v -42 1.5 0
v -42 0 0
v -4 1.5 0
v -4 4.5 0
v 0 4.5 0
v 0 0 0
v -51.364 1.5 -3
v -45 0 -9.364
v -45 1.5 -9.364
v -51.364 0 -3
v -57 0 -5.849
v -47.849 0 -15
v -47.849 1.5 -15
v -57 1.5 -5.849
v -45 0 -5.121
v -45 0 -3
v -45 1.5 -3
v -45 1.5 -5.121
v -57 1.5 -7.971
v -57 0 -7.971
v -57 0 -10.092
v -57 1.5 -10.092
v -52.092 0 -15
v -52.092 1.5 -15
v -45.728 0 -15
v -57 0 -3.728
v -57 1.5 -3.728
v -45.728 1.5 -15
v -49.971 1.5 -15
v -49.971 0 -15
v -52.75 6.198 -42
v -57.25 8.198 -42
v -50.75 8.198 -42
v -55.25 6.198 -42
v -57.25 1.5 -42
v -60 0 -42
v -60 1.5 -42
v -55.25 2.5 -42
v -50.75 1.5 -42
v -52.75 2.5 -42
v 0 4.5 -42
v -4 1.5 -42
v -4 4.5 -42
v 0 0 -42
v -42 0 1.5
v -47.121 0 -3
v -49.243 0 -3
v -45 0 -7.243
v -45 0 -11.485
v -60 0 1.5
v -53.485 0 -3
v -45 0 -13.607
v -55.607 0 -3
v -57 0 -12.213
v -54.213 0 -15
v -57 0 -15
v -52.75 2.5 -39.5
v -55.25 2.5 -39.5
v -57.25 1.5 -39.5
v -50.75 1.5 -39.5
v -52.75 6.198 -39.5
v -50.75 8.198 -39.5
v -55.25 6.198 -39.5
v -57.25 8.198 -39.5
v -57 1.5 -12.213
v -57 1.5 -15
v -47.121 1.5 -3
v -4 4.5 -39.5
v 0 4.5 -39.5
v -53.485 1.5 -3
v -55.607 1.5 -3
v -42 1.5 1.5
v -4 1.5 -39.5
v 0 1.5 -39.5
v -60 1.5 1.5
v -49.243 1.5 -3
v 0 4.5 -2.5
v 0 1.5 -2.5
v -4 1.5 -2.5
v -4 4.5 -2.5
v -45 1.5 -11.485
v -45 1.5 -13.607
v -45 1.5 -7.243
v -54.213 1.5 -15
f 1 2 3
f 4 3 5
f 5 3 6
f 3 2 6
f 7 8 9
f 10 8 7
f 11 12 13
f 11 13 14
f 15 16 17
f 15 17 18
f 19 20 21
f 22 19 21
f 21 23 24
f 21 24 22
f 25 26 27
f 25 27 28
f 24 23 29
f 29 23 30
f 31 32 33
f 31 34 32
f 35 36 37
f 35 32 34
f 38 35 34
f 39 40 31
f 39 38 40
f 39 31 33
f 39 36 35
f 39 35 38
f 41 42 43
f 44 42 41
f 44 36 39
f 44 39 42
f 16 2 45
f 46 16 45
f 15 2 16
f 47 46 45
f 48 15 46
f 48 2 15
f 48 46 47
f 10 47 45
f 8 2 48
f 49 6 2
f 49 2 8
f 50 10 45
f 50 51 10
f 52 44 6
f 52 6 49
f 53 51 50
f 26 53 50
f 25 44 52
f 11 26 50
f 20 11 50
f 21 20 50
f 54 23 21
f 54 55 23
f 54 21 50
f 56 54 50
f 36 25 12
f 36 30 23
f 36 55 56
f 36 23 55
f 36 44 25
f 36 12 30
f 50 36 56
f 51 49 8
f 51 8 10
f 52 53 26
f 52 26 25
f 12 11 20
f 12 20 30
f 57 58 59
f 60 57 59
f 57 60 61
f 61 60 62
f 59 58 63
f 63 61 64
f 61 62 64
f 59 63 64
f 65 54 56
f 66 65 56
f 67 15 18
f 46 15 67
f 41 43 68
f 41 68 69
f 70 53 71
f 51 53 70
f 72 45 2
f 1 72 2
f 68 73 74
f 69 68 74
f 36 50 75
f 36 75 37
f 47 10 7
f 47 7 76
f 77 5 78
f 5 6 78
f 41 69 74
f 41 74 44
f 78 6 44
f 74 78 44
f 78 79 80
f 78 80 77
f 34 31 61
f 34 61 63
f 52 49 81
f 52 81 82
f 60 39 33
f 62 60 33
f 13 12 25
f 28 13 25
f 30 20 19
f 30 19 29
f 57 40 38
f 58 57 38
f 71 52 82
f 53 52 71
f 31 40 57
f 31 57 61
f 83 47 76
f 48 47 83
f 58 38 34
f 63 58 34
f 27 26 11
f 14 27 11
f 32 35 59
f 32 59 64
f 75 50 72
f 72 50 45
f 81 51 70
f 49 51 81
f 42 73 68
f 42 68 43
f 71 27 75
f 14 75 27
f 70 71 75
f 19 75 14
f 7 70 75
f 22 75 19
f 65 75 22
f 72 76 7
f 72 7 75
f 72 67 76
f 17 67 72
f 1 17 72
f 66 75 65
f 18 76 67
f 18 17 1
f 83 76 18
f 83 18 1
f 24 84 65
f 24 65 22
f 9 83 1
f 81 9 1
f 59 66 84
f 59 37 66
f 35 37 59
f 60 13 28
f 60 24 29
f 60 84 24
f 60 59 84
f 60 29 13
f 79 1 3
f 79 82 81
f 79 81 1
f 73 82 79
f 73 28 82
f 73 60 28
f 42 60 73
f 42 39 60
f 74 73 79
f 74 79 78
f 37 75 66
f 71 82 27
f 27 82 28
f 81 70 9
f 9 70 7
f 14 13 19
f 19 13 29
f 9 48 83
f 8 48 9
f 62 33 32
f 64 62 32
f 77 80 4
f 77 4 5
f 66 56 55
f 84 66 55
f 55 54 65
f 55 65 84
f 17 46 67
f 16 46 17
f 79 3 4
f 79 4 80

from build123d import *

# Parameters (mm, degrees)
SKETCH_1_W          = 60
SKETCH_1_H          = 42
EXTRUDE_1_DEPTH     = 1.5
SKETCH_2_W          = 18
SKETCH_2_H          = 1.5
EXTRUDE_2_DEPTH     = 1.5
SKETCH_3_W          = 12
SKETCH_3_H          = 12
CUT_EXTRUDE_1_DEPTH = 74.254692682
EXTRUDE_1_2_DEPTH   = 1.5
SKETCH_5_W          = 6.5
SKETCH_5_H          = 6.698076211
SKETCH_5_W_2        = 2.5
SKETCH_5_H_2        = 3.698076211
EXTRUDE_3_DEPTH     = 2.5
SKETCH_7_W          = 4
SKETCH_7_H          = 2.5
EXTRUDE_4_DEPTH     = 3


with BuildPart() as part:
    # Эскиз1 → Extrude 1 (new body)
    with BuildSketch(Plane(origin=(0, 0, 0), x_dir=(1, 0, 0), z_dir=(0, 1, 0))):
        with Locations((-30, 21)):
            Rectangle(SKETCH_1_W, SKETCH_1_H)
    extrude(amount=EXTRUDE_1_DEPTH)

    # Эскиз2 → Бобышка-Вытянуть2 (add, through all)
    with BuildSketch(Plane(origin=(0, 0, 0), x_dir=(1, 0, 0), z_dir=(0, 1, 0))):
        with Locations((-51, -0.75)):
            Rectangle(SKETCH_2_W, SKETCH_2_H)
    extrude(amount=EXTRUDE_2_DEPTH)

    # Эскиз3 → Вырез-Вытянуть1 (cut, through all)
    with BuildSketch(Plane(origin=(0, 0, 0), x_dir=(1, 0, 0), z_dir=(0, 1, 0))):
        with Locations((-51, 9)):
            Rectangle(SKETCH_3_W, SKETCH_3_H)
    extrude(amount=CUT_EXTRUDE_1_DEPTH, mode=Mode.SUBTRACT)

    # Эскиз4 → Extrude 1 2 (add, through all)
    with BuildSketch(Plane(origin=(0, 0, 0), x_dir=(1, 0, 0), z_dir=(0, 1, 0))):
        Polygon((-51.242640687, 1), (-43, 9.242640687), (-41.939339828, 8.181980515), (-50.181980515, -0.060660172), align=None)
        Polygon((-55.485281374, 1), (-43, 13.485281374), (-41.939339828, 12.424621202), (-54.424621202, -0.060660172), align=None)
        Polygon((-59, 1.727922061), (-43, 17.727922061), (-41.939339828, 16.66726189), (-57.939339828, 0.66726189), align=None)
        Polygon((-59, 5.970562748), (-43, 21.970562748), (-41.939339828, 20.909902577), (-57.939339828, 4.909902577), align=None)
        Polygon((-59, 10.213203436), (-52.213203436, 17), (-51.152543264, 15.939339828), (-57.939339828, 9.152543264), align=None)
    extrude(amount=EXTRUDE_1_2_DEPTH)

    # Эскиз5 → Бобышка-Вытянуть3 (add)
    with BuildSketch(Plane(origin=(0, 0, -42), x_dir=(-1, 0, 0), z_dir=(0, 0, -1))):
        with Locations((54, 4.849038106)):
            Rectangle(SKETCH_5_W, SKETCH_5_H)
        with Locations((54, 4.349038106)):
            Rectangle(SKETCH_5_W_2, SKETCH_5_H_2, mode=Mode.SUBTRACT)
    extrude(amount=-EXTRUDE_3_DEPTH)

    # Эскиз7 → Бобышка-Вытянуть4 (add)
    with BuildSketch(Plane(origin=(0, 1.5, 0), x_dir=(1, 0, 0), z_dir=(0, 1, 0))):
        with Locations((-2, 1.25)):
            Rectangle(SKETCH_7_W, SKETCH_7_H)
        with Locations((-2, 40.75)):
            Rectangle(SKETCH_7_W, SKETCH_7_H)
    extrude(amount=EXTRUDE_4_DEPTH)


solid = part.part
